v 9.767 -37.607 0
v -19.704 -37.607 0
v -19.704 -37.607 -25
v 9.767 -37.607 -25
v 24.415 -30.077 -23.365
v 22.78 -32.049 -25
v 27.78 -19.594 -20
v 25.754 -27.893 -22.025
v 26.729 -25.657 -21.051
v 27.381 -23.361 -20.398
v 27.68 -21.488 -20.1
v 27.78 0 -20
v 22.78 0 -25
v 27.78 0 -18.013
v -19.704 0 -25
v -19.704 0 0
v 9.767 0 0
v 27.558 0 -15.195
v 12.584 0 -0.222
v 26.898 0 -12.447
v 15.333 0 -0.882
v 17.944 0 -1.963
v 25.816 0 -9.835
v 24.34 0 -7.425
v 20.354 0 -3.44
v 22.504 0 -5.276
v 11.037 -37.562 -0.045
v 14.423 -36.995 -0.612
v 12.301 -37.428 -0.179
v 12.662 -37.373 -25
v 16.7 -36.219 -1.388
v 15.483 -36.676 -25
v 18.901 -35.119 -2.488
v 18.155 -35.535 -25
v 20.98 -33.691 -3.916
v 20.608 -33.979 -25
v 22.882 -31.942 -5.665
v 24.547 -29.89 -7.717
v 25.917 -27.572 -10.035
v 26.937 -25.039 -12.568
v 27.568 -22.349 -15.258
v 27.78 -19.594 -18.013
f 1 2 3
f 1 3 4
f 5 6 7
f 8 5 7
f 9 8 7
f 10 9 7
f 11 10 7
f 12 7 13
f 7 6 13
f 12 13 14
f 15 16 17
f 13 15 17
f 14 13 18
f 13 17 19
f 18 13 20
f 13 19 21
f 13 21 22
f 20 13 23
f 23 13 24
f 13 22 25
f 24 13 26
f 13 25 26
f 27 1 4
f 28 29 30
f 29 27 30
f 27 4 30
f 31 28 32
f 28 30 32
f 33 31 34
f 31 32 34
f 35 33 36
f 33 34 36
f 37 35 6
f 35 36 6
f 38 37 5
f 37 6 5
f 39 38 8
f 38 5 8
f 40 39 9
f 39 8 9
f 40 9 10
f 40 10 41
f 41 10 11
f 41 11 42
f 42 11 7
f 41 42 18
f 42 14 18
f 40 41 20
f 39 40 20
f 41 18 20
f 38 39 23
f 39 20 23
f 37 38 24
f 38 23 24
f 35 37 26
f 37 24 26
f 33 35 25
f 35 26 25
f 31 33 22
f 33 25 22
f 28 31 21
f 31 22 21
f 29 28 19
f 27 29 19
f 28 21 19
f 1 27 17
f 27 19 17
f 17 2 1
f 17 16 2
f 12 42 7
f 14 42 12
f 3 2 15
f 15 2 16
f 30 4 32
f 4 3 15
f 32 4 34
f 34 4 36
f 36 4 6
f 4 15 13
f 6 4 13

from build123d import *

# Parameters (mm, degrees)
F0_W     = 47.483348
F0_H     = 37.607089
F2_DEPTH = 25
F3_SIZE  = 5
F4_R     = 18.013222


with BuildPart() as f2:
    # F0 (on Top) → F2 (new body)
    with BuildSketch(Plane.XY):
        with Locations((4.038073, -18.803544)):
            Rectangle(F0_W, F0_H)
    extrude(amount=-F2_DEPTH)

    # F3
    f3_edges = [f2.edges().sort_by_distance(p)[0] for p in [
        (27.779747, -18.803544, -25),
    ]]
    chamfer(f3_edges, length=F3_SIZE)

    # F4
    f4_edges = [f2.edges().sort_by_distance(p)[0] for p in [
        (27.779747, -18.803544, 0),
        (27.779747, -37.607089, -10),
    ]]
    fillet(f4_edges, radius=F4_R)


solid = f2.part
